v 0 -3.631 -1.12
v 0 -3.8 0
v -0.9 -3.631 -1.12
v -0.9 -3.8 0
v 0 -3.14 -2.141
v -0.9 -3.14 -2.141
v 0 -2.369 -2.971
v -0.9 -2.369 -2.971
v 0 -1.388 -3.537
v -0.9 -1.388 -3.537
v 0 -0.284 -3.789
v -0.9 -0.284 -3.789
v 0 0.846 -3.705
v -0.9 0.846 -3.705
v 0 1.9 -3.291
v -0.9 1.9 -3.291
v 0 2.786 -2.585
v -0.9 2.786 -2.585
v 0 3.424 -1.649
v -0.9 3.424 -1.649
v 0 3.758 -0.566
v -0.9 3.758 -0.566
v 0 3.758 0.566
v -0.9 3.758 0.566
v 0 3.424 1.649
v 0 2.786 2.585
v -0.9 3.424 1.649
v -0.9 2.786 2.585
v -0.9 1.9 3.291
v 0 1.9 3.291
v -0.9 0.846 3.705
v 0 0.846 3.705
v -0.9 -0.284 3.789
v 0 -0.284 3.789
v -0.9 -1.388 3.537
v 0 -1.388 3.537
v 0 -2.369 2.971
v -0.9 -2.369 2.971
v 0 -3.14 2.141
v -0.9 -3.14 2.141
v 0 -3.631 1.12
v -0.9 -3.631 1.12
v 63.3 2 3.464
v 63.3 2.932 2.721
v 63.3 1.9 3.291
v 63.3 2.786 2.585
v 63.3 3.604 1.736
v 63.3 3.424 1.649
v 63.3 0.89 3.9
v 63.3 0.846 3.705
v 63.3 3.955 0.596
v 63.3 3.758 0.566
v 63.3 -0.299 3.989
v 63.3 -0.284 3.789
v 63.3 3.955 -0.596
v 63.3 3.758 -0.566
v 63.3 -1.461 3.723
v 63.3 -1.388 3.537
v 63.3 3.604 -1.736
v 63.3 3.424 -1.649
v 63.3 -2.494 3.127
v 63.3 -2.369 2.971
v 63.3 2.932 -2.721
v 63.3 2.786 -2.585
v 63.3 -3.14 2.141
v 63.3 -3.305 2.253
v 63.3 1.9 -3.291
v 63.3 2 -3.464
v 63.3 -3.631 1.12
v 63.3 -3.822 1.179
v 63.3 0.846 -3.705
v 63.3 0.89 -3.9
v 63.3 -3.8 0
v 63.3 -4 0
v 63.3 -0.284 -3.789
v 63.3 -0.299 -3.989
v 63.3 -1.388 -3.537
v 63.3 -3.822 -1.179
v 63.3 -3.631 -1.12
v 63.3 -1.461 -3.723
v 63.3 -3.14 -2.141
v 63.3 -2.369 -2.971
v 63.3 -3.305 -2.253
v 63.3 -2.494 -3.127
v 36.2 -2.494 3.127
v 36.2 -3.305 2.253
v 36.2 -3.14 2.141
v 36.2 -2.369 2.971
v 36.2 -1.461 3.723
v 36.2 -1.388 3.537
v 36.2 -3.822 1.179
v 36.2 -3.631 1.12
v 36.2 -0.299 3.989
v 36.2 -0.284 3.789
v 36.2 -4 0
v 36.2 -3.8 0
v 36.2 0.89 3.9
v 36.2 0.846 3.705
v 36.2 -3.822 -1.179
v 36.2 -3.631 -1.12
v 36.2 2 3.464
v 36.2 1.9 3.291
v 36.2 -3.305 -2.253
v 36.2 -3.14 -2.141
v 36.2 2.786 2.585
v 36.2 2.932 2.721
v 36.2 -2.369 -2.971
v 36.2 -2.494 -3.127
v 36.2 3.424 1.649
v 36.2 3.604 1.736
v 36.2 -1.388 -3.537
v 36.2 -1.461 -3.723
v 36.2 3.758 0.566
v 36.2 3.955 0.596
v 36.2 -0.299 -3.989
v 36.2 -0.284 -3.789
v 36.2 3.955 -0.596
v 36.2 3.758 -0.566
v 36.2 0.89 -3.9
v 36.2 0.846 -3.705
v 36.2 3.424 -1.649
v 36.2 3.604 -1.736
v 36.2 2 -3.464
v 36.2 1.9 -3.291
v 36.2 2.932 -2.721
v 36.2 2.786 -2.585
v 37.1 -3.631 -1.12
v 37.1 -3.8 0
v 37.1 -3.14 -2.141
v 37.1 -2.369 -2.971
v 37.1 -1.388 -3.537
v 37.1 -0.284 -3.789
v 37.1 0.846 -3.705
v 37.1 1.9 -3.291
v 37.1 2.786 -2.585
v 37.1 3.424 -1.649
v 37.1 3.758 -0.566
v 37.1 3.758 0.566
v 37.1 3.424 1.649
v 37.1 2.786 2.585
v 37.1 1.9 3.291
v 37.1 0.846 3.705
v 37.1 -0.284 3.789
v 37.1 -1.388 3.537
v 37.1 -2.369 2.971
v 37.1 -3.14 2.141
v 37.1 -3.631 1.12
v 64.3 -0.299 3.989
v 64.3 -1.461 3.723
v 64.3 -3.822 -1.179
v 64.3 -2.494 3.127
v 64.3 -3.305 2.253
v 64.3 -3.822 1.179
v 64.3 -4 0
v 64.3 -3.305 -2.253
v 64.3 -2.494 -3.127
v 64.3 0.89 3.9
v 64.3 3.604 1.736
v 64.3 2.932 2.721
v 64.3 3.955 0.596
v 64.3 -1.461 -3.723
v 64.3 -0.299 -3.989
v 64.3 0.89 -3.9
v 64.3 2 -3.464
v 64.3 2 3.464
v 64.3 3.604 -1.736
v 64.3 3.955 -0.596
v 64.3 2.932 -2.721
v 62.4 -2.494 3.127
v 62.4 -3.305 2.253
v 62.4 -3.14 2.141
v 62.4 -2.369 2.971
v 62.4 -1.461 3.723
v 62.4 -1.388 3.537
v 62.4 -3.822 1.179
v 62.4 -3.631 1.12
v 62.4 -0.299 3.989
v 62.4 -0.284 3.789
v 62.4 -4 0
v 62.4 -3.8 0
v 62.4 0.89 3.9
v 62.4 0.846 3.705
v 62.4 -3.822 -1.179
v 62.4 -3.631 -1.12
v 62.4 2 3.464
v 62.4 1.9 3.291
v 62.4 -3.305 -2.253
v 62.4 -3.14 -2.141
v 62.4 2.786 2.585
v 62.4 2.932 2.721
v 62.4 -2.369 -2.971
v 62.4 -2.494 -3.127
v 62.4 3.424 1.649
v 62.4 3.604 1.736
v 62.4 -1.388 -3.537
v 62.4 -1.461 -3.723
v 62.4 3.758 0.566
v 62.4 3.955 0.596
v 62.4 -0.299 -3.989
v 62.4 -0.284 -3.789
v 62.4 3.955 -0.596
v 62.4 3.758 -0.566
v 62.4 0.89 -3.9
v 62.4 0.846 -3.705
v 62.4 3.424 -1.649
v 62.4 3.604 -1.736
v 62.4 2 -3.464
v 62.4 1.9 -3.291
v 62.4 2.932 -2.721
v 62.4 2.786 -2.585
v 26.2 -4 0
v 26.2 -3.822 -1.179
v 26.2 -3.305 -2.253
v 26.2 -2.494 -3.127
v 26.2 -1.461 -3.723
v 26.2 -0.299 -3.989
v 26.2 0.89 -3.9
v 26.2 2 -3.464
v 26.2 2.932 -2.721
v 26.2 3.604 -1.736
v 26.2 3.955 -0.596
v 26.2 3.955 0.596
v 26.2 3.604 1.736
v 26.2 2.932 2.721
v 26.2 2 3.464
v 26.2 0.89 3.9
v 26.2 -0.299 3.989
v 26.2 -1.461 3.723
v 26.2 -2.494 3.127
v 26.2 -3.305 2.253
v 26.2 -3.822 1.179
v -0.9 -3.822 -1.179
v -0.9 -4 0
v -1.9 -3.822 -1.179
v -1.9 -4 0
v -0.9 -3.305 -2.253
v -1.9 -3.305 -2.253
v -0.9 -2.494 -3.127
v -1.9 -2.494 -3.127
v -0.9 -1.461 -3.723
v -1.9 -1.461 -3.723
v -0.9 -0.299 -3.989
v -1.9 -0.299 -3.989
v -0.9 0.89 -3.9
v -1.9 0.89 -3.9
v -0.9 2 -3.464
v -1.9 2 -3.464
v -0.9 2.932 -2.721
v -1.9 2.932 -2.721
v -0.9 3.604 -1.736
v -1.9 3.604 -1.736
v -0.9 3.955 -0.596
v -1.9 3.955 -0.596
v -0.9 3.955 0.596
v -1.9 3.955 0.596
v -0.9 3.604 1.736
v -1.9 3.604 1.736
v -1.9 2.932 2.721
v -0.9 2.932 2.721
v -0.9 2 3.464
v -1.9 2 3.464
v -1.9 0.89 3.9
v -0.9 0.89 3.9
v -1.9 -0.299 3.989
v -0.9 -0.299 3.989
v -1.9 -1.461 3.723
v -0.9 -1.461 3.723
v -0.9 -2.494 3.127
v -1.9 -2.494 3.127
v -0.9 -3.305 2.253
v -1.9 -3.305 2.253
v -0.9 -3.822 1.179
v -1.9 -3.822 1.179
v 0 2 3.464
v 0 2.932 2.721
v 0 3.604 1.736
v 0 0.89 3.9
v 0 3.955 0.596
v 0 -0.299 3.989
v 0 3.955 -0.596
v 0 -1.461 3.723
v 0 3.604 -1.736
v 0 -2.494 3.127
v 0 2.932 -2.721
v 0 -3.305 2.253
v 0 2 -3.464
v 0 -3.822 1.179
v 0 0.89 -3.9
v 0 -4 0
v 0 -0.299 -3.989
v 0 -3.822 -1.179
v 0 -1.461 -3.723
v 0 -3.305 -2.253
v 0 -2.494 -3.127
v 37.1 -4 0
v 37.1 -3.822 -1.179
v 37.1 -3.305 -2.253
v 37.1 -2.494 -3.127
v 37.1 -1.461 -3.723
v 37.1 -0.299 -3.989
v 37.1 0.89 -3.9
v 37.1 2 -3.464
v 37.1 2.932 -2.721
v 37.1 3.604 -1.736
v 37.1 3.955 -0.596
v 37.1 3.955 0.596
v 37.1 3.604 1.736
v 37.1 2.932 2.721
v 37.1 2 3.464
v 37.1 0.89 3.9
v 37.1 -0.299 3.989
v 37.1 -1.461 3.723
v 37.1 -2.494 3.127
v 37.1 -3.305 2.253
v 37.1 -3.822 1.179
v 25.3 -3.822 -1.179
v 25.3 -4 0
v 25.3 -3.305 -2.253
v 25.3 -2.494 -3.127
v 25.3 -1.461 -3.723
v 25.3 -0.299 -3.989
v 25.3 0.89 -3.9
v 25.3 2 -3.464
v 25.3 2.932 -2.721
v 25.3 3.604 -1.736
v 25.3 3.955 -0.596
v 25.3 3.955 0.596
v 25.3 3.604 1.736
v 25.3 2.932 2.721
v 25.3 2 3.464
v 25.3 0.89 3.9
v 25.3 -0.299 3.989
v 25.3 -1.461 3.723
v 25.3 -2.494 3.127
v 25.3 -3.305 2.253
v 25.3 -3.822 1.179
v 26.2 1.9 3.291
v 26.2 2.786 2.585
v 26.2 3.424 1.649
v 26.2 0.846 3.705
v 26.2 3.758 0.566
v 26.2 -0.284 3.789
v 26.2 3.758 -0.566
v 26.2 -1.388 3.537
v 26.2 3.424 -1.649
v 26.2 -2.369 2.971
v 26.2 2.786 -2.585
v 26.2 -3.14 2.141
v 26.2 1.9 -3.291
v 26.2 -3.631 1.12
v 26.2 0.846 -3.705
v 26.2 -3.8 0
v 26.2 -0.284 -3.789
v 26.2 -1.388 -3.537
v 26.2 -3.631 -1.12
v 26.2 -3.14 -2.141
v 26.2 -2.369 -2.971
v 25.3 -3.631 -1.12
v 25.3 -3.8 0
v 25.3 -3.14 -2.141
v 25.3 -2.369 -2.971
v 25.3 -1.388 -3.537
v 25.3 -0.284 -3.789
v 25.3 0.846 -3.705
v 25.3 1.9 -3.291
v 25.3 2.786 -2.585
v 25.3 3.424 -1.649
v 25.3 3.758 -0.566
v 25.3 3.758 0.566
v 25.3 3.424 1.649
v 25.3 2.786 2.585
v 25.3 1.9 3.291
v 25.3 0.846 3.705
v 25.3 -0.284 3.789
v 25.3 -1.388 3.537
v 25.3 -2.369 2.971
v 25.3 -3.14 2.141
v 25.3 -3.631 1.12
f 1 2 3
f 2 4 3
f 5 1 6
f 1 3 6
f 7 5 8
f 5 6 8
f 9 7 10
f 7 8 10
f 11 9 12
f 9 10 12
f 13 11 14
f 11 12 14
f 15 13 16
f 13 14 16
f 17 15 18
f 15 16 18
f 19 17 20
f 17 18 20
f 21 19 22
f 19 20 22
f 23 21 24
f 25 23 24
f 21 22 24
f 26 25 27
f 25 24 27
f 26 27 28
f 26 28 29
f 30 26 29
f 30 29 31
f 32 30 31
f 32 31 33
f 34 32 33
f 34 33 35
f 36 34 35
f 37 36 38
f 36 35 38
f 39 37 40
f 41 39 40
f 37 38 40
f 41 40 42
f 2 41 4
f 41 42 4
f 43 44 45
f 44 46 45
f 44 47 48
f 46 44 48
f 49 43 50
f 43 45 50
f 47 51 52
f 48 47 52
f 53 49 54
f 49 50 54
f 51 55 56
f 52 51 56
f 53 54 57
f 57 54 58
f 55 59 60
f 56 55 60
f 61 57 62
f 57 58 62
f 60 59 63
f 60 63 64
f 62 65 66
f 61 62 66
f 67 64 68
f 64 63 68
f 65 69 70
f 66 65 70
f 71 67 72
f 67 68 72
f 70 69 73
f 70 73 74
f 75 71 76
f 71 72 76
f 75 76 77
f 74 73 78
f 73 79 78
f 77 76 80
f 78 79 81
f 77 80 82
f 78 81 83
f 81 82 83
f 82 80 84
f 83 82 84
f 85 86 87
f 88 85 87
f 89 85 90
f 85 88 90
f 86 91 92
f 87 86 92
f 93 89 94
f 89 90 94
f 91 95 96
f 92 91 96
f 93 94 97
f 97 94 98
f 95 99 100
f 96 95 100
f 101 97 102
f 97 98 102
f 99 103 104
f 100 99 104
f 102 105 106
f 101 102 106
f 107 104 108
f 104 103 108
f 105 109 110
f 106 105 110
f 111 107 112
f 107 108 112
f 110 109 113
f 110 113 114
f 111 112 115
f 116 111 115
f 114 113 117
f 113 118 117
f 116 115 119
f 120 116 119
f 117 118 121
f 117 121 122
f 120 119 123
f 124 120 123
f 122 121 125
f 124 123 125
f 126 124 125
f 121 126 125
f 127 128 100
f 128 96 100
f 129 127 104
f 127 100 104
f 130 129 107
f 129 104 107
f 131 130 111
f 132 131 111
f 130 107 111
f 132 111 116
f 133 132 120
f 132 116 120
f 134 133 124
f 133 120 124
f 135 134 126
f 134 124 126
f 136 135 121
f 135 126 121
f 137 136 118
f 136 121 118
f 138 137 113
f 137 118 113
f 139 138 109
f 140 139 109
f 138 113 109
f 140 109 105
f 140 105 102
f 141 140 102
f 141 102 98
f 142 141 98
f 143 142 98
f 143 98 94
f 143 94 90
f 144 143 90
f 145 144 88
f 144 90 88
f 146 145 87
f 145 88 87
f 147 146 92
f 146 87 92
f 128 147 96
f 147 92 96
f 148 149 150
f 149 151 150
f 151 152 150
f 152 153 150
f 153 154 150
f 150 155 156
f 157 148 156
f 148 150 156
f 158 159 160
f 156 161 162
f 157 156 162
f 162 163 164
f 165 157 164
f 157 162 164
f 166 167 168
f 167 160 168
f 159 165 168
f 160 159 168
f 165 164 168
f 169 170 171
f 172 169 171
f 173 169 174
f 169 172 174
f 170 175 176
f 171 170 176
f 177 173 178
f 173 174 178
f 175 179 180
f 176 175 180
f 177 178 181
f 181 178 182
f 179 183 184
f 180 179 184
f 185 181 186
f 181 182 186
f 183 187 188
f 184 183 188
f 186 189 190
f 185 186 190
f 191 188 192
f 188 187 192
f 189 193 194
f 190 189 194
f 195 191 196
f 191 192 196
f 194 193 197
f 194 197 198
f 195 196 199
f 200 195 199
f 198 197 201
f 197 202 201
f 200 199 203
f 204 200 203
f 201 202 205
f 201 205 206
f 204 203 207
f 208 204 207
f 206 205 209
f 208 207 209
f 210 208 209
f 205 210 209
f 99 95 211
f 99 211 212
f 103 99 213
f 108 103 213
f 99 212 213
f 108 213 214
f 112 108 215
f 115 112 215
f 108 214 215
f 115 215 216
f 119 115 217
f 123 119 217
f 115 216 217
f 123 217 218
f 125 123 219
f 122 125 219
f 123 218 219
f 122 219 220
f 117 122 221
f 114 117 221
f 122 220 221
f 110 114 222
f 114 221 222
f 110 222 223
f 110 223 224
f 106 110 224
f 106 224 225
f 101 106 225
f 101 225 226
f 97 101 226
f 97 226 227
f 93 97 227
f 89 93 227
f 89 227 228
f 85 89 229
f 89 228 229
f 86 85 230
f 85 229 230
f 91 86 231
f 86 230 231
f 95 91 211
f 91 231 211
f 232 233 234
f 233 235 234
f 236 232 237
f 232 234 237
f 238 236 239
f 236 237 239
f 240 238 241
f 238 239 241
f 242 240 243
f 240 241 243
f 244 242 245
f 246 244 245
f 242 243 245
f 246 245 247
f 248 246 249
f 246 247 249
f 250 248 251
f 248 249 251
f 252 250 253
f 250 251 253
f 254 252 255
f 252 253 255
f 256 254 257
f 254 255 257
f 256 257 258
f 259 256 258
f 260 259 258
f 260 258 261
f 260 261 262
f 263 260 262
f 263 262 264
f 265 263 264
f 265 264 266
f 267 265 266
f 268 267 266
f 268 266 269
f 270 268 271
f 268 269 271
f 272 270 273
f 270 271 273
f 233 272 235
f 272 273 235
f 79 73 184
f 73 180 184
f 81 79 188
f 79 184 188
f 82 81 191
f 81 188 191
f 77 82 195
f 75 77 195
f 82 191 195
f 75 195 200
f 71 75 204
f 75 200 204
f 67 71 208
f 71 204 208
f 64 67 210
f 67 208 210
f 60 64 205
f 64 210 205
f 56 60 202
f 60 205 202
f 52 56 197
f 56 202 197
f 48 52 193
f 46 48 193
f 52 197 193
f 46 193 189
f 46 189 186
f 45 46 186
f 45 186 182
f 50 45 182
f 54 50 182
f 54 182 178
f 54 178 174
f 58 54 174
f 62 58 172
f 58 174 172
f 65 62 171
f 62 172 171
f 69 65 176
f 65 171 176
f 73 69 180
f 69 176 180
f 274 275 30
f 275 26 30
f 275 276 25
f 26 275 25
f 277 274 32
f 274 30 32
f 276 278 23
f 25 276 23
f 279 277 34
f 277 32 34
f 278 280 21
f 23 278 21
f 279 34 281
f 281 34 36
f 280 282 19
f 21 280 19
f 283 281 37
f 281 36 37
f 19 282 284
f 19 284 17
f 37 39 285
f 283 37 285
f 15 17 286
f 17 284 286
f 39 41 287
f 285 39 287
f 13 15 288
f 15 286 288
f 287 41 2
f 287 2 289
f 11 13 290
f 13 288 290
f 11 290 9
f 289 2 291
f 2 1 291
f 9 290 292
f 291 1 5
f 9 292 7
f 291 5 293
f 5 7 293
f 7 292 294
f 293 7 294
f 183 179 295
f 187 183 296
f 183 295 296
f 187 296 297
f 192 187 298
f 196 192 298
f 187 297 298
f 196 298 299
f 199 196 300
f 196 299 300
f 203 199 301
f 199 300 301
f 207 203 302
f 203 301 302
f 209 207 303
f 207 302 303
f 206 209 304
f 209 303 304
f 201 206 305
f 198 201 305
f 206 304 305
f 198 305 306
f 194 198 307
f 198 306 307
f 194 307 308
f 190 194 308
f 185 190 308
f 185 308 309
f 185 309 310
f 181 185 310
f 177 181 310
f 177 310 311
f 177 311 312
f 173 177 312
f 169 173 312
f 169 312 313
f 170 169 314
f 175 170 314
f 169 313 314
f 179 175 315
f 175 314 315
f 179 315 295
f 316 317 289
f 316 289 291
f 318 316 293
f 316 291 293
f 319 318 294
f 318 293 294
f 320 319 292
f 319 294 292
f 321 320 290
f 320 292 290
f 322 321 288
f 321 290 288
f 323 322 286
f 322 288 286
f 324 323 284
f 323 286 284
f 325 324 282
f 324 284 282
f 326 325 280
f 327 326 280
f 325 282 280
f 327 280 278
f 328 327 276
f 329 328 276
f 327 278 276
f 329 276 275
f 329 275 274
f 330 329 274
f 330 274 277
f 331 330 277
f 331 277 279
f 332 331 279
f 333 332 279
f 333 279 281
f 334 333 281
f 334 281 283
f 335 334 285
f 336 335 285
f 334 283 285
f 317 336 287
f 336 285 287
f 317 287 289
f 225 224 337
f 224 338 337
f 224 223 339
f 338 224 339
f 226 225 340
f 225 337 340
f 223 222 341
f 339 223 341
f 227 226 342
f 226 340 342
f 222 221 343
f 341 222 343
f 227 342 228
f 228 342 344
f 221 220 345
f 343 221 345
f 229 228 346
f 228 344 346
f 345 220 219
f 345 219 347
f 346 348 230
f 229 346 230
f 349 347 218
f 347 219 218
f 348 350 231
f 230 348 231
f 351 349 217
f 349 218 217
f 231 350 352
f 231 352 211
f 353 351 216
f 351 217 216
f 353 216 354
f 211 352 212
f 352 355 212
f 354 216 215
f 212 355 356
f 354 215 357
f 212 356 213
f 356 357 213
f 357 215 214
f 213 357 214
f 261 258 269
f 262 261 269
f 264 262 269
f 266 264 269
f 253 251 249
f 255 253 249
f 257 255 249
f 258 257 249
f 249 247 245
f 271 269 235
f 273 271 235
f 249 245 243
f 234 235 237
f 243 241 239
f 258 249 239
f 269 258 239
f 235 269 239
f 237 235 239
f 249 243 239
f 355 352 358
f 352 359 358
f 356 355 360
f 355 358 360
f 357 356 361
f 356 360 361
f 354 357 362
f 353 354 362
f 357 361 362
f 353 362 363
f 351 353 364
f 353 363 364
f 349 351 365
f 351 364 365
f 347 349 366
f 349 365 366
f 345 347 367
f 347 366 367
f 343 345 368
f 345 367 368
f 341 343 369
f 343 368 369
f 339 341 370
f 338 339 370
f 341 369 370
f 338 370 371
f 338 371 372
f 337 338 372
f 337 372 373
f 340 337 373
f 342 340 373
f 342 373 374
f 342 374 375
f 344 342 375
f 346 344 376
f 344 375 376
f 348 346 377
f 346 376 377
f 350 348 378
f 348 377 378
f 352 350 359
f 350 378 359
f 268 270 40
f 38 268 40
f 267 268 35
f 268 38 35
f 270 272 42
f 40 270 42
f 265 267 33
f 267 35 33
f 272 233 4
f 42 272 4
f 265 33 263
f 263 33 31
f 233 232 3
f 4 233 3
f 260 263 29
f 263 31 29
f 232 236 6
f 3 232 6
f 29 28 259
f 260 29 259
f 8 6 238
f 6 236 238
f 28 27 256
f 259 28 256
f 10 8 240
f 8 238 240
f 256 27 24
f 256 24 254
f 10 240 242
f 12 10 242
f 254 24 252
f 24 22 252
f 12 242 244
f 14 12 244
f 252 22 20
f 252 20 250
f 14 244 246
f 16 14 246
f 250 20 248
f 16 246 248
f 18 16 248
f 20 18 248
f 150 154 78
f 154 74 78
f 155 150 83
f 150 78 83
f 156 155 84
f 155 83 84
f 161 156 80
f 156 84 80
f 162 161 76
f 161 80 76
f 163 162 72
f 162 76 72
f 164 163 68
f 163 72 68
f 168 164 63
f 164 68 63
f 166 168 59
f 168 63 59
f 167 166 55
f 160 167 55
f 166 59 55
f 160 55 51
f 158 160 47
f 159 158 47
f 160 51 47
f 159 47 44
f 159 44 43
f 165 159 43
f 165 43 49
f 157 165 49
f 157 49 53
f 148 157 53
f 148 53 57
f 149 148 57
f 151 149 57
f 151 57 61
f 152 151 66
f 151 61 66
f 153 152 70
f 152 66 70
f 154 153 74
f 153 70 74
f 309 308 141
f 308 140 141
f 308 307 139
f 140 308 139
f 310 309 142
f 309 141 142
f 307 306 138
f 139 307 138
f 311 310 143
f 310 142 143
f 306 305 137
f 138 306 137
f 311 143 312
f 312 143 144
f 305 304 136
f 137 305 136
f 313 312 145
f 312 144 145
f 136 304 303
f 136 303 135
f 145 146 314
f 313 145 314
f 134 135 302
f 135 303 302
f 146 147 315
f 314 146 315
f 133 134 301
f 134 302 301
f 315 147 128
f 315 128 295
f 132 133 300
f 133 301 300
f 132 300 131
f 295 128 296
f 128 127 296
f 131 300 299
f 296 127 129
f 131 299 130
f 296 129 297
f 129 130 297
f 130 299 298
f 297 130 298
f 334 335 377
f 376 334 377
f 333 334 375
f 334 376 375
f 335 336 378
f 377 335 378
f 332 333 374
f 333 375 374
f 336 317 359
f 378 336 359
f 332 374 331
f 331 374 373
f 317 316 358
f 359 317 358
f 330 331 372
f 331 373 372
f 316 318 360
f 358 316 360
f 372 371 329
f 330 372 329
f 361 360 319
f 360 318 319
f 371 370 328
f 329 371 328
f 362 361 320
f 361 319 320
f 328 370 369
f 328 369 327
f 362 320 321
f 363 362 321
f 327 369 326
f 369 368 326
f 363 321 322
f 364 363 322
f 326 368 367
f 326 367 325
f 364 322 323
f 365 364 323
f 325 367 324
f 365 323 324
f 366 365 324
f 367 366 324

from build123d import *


with BuildPart() as part:
    # Sketch1 → Revolve1 (revolve)
    with BuildSketch(Plane.XY, mode=Mode.PRIVATE) as revolve1_sk:
        Polygon((0, 0), (64.3, 0), (64.3, 4), (63.3, 4), (63.3, 3.8), (62.4, 3.8), (62.4, 4), (37.1, 4), (37.1, 3.8), (36.2, 3.8), (36.2, 4), (26.2, 4), (26.2, 3.8), (25.3, 3.8), (25.3, 4), (0, 4), (0, 3.8), (-0.9, 3.8), (-0.9, 4), (-1.9, 4), (-1.9, 0), align=None)
    revolve(revolve1_sk.sketch.rotate(Axis((0, 0, 0), (1, 0, 0)), 180), axis=Axis((0, 0, 0), (1, 0, 0)))


solid = part.part
